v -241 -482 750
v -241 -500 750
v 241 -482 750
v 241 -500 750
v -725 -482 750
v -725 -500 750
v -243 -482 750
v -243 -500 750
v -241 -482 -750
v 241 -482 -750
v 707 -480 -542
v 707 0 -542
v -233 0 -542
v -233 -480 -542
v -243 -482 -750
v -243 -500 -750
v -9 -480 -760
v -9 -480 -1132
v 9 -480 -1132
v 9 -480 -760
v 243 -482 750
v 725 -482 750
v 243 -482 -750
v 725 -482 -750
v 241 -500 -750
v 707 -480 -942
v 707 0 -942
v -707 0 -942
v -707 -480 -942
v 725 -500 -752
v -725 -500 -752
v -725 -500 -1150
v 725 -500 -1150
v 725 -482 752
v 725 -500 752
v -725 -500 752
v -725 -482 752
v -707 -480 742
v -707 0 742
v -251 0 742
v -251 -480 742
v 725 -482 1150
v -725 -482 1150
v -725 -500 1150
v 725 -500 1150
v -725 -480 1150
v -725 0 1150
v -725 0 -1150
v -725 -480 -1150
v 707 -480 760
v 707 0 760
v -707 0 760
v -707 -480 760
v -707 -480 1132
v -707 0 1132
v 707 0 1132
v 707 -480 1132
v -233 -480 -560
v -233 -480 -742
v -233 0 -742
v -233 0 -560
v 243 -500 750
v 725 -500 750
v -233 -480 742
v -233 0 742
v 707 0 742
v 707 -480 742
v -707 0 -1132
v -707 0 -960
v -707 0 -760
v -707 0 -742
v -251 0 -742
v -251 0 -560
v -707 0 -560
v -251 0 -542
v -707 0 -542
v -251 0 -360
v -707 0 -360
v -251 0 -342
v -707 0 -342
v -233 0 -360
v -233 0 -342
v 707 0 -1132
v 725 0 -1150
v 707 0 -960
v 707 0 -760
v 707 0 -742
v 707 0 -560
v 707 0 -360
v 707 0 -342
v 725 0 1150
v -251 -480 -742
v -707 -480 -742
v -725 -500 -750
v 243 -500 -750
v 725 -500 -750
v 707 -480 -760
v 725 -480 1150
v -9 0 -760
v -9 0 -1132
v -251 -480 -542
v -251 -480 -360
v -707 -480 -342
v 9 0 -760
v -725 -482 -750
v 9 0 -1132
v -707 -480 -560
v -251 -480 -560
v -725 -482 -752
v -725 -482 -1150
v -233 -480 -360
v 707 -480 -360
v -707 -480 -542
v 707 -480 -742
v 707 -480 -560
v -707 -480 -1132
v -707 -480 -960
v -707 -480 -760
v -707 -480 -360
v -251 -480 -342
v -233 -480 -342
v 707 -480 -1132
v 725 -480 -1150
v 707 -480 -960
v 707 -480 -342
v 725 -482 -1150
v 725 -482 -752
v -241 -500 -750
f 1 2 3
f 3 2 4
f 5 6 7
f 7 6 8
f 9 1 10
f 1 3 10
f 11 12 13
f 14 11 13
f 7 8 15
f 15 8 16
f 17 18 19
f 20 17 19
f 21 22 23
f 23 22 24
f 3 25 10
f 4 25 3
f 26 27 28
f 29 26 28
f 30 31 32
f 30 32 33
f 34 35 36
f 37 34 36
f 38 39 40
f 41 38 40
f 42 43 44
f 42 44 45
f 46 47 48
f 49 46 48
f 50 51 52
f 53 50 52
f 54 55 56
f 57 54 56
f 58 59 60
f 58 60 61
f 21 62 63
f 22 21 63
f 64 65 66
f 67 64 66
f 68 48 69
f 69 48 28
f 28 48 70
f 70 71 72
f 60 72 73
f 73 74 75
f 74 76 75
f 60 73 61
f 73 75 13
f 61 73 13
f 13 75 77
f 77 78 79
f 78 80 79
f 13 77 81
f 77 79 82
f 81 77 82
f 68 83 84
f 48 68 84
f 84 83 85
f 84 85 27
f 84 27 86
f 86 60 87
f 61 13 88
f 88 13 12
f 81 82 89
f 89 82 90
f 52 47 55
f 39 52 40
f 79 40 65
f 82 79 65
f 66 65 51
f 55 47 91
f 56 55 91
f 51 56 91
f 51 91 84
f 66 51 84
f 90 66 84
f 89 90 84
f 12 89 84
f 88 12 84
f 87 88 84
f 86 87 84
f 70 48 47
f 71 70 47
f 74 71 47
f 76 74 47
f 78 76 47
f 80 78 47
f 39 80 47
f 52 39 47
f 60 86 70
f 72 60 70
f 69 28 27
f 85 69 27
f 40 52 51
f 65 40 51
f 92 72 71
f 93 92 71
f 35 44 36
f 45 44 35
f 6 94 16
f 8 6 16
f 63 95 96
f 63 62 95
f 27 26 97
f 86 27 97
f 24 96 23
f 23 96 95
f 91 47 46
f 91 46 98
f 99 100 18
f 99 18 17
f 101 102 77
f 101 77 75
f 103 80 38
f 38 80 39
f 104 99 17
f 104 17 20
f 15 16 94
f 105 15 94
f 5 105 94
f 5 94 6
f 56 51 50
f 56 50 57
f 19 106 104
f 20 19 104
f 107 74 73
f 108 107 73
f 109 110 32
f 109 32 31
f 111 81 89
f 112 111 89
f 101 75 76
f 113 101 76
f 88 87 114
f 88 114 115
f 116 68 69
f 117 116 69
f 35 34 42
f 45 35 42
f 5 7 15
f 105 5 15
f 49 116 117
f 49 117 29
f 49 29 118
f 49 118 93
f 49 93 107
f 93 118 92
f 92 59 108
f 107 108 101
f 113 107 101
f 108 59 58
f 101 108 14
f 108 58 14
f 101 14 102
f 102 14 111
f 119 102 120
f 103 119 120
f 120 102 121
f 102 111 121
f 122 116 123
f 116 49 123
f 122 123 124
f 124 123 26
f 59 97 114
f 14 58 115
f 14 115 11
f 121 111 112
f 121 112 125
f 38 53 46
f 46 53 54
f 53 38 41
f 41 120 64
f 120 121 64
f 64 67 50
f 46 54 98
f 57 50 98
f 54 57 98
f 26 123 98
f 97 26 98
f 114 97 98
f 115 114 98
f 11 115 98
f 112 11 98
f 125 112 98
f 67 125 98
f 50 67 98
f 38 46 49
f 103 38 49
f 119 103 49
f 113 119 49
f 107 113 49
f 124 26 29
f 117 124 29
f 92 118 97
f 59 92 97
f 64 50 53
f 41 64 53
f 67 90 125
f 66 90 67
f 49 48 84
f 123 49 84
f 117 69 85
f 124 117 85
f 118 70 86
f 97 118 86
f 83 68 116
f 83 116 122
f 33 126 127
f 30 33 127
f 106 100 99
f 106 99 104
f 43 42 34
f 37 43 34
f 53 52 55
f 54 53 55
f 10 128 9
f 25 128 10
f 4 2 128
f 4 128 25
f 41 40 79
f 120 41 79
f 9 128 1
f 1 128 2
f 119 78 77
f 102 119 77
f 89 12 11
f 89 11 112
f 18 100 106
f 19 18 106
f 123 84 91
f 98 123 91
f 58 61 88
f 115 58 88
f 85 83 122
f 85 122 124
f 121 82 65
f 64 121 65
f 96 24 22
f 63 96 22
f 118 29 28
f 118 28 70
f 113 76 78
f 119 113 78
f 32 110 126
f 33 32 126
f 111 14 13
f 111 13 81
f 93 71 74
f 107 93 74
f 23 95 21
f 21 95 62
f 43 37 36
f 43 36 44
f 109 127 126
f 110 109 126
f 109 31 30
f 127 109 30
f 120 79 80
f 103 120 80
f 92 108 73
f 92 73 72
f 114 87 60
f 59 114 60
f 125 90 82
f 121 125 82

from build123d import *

# Parameters (mm, degrees)
F0_W      = 1450
F0_H      = 2300
F1_DEPTH  = 500
F2_W      = 482
F2_H      = 1500
F3_DEPTH  = 18
F5_DEPTH  = 1450
F6_W      = 1414
F6_H      = 2264
F7_DEPTH  = 480
F9_DEPTH  = 480
F10_W     = 18
F10_H     = 372
F11_DEPTH = 480


with BuildPart() as f1:
    # F0 (on Front) → F1 (new body)
    with BuildSketch(Plane.XZ):
        Rectangle(F0_W, F0_H)
    extrude(amount=F1_DEPTH)

    # F2 (on face) → F3 (cut)
    with BuildSketch(Plane.XZ.offset(500)):
        Polygon((725, 752), (-725, 752), (-725, 750), (-243, 750), (-243, -750), (-725, -750), (-725, -752), (725, -752), (725, -750), (243, -750), (243, 750), (725, 750), align=None)
        Rectangle(F2_W, F2_H, mode=Mode.SUBTRACT)
    extrude(amount=-F3_DEPTH, mode=Mode.SUBTRACT)

    # F4 (on face) → F5 (cut)
    with BuildSketch(Plane.YZ.offset(725)):
        Polygon((-480, 1150), (-482, 1150), (-482, -1150), (-480, -1150), (-480, -753), (-480, -747), (-480, 747), (-480, 753), align=None)
    extrude(amount=-F5_DEPTH, mode=Mode.SUBTRACT)

    # F6 (on face) → F7 (cut)
    with BuildSketch(Plane.XZ):
        Rectangle(F6_W, F6_H)
    extrude(amount=F7_DEPTH, mode=Mode.SUBTRACT)

    # F8 (on face) → F9 (join)
    with BuildSketch(Plane.XZ):
        Polygon((-725, -960), (725, -960), (725, -942), (-233, -942), (-251, -942), (-725, -942), align=None)
        Polygon((-233, -760), (725, -760), (725, -742), (-233, -742), (-233, -560), (725, -560), (725, -542), (-233, -542), (-233, -360), (725, -360), (725, -342), (-233, -342), (-233, 742), (725, 742), (725, 760), (-725, 760), (-725, 742), (-251, 742), (-251, -342), (-725, -342), (-725, -360), (-251, -360), (-251, -542), (-725, -542), (-725, -560), (-251, -560), (-251, -742), (-725, -742), (-725, -760), (-251, -760), align=None)
    extrude(amount=F9_DEPTH)


with BuildPart() as f11:
    # F10 (on face) → F11 (new body)
    with BuildSketch(Plane.XZ):
        with Locations((0, -946)):
            Rectangle(F10_W, F10_H)
    extrude(amount=F11_DEPTH)


solid = Compound([f1.part, f11.part])
